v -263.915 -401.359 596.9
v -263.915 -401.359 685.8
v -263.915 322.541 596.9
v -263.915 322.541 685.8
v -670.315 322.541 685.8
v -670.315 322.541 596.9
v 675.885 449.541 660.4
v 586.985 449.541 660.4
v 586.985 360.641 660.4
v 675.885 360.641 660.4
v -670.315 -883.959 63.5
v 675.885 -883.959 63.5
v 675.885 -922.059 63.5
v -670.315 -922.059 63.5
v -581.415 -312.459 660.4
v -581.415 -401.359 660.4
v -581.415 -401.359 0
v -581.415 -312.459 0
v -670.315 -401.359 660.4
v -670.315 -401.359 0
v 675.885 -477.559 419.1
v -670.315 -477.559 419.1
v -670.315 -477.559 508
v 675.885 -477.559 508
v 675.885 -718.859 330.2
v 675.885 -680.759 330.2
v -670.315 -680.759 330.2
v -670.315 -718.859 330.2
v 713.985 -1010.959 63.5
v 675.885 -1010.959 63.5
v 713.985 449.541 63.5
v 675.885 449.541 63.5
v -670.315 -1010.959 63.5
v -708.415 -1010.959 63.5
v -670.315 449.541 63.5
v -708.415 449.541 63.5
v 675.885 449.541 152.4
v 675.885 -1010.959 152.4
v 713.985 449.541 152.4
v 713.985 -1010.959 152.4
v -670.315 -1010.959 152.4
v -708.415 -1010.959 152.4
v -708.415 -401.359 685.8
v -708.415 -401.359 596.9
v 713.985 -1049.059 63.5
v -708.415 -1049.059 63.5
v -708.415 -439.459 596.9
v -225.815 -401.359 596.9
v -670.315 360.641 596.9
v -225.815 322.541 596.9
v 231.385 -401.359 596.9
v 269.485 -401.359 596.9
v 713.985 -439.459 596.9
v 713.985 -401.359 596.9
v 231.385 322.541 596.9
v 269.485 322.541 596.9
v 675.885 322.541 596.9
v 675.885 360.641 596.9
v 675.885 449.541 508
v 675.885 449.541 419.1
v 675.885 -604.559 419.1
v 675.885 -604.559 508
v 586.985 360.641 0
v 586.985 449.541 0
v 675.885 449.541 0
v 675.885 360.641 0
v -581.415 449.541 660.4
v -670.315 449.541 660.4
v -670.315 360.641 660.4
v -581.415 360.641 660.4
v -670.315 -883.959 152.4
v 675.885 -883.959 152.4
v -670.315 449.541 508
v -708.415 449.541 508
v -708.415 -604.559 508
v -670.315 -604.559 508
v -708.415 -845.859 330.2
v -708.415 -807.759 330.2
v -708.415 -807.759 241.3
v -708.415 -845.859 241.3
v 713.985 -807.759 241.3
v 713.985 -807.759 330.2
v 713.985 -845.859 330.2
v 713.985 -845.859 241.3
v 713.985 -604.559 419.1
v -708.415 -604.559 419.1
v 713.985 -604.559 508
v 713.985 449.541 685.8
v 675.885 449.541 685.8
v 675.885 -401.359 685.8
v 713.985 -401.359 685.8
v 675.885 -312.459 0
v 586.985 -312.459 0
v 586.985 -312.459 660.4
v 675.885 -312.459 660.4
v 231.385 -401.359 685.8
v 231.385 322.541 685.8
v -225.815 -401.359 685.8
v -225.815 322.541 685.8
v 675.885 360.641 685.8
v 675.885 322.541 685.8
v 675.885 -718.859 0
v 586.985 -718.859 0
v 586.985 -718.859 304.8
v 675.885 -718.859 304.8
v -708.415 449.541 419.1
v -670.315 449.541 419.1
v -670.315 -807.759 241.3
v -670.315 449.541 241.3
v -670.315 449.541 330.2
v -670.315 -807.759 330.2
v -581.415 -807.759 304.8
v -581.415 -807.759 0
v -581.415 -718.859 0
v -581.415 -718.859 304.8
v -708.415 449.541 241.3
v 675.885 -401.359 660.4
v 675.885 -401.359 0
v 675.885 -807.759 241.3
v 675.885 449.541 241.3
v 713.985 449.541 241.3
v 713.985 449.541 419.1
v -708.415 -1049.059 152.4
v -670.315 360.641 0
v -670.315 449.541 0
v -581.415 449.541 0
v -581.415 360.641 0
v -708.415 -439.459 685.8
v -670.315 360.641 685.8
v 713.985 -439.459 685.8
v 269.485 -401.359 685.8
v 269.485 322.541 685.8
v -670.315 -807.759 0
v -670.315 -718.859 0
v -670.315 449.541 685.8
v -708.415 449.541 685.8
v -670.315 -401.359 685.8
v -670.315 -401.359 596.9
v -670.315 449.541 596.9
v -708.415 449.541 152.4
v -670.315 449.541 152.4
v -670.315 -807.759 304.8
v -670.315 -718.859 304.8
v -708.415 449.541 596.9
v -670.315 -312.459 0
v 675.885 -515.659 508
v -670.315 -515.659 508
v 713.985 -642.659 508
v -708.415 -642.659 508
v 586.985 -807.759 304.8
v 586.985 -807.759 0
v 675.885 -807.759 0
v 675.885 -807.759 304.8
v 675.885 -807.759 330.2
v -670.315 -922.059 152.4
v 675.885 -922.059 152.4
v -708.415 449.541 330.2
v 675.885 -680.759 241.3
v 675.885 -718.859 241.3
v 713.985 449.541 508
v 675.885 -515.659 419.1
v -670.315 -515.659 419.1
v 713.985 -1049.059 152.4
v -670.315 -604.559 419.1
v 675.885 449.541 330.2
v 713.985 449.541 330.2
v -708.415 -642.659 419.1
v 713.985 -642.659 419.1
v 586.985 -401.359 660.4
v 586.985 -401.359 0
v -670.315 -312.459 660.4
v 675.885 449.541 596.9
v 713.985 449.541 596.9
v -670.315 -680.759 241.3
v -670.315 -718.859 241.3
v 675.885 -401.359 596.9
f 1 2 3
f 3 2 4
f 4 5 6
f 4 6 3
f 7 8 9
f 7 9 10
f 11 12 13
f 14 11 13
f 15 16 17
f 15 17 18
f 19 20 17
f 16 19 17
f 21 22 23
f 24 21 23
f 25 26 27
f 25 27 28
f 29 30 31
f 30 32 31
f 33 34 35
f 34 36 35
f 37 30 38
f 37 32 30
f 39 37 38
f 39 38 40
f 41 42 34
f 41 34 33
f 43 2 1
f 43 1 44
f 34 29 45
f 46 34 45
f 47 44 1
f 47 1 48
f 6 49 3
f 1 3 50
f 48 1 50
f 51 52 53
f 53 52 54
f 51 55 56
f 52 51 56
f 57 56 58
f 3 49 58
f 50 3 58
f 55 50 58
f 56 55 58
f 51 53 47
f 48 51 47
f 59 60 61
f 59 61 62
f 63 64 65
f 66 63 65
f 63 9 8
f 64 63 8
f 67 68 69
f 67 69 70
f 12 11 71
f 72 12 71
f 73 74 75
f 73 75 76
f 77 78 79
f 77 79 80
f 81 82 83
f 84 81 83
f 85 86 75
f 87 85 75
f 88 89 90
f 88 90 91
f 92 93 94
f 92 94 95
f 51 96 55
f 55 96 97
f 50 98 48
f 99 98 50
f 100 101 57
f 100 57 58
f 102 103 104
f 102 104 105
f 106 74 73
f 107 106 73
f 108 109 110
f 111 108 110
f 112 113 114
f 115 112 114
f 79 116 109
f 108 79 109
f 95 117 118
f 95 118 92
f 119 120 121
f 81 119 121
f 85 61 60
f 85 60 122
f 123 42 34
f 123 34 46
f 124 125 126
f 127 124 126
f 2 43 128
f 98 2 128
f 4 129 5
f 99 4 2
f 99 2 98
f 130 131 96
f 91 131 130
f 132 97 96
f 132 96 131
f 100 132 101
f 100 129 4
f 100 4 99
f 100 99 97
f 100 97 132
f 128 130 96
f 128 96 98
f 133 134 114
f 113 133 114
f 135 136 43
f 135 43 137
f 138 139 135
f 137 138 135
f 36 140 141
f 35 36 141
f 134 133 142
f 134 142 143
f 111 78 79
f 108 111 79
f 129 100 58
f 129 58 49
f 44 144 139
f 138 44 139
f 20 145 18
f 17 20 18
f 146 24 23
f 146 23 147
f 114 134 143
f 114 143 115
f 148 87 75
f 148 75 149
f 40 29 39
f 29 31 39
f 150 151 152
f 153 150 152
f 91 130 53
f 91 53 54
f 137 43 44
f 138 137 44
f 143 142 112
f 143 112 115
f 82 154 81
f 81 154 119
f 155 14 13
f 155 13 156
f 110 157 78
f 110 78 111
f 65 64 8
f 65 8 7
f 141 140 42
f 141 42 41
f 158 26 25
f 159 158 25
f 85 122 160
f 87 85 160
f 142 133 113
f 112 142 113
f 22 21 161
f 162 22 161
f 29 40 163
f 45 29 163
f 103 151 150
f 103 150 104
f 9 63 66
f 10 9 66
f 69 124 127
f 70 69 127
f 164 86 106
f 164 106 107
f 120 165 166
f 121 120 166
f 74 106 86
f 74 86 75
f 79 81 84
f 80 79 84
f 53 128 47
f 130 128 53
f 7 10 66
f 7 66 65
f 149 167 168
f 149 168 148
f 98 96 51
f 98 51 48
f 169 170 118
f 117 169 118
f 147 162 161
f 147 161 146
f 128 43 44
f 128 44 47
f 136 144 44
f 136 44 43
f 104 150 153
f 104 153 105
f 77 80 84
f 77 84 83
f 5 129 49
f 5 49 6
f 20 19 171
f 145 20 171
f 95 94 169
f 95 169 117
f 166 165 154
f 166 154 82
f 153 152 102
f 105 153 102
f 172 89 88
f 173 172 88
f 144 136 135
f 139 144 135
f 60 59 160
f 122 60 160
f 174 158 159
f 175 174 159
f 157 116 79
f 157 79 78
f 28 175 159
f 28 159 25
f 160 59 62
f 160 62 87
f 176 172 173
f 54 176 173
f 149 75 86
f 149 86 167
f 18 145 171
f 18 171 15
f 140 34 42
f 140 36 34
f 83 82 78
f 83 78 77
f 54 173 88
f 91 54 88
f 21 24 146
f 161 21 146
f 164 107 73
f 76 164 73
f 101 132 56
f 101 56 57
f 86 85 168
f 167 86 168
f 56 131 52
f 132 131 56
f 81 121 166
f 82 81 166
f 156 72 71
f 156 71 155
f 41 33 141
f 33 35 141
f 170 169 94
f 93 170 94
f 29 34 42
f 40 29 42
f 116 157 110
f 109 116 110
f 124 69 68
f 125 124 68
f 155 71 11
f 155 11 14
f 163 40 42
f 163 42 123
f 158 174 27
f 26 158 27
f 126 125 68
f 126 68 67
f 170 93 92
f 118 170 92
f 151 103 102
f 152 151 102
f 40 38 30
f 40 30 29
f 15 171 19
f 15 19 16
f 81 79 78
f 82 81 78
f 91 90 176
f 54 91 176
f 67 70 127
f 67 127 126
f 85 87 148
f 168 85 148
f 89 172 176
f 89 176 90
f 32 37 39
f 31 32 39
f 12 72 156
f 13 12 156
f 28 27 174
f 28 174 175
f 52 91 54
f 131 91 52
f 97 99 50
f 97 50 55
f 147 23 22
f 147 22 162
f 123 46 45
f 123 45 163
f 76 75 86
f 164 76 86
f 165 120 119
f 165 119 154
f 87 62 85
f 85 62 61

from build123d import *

# Parameters (mm, degrees)
F0_W          = 88.9
F0_H          = 88.9
F1_DEPTH      = 660.4
F2_W          = 370.2267042065
F2_H          = 403.1921241929
F3_DEPTH      = 1183.64
F3_DEPTH_BACK = 1132.84
F4_W          = 38.1
F4_H          = 88.9
F5_DEPTH      = 1257.3
F5_DEPTH_BACK = 203.2
F7_DEPTH      = 2004.06
F8_W          = 38.1
F8_H          = 723.9
F9_DEPTH      = 88.9
F10_W         = 38.1
F10_H         = 88.9
F11_DEPTH     = 1422.4
F12_W         = 38.1
F12_H         = 88.9
F13_DEPTH     = 1346.2


with BuildPart() as f1:
    # F0 (on Top) → F1 (new body)
    with BuildSketch(Plane.XY):
        with Locations((-625.8649276083, 405.0910130501)):
            Rectangle(F0_W, F0_H)
    extrude(amount=F1_DEPTH)


with BuildPart() as f1b:
    # F0 (on Top) → F1, piece 2 (new body)
    with BuildSketch(Plane.XY):
        with Locations((631.4350723917, 405.0910130501)):
            Rectangle(F0_W, F0_H)
    extrude(amount=F1_DEPTH)


with BuildPart() as f1c:
    # F0 (on Top) → F1, piece 3 (new body)
    with BuildSketch(Plane.XY):
        with Locations((-625.8649276083, -356.9089869499)):
            Rectangle(F0_W, F0_H)
    extrude(amount=F1_DEPTH)


with BuildPart() as f1d:
    # F0 (on Top) → F1, piece 4 (new body)
    with BuildSketch(Plane.XY):
        with Locations((631.4350723917, -356.9089869499)):
            Rectangle(F0_W, F0_H)
    extrude(amount=F1_DEPTH)


with BuildPart() as f1e:
    # F0 (on Top) → F1, piece 5 (new body)
    with BuildSketch(Plane.XY):
        with Locations((-625.8649276083, -763.3089869499)):
            Rectangle(F0_W, F0_H)
    extrude(amount=F1_DEPTH)


with BuildPart() as f1f:
    # F0 (on Top) → F1, piece 6 (new body)
    with BuildSketch(Plane.XY):
        with Locations((631.4350723917, -763.3089869499)):
            Rectangle(F0_W, F0_H)
    extrude(amount=F1_DEPTH)


with BuildPart() as f3_tool:
    # F2 (on Right) → F3 (new body, two sides)
    with BuildSketch(Plane.YZ) as f3_sk:
        with Locations((-782.7632725239, 506.3960620965)):
            Rectangle(F2_W, F2_H)
    extrude(amount=-F3_DEPTH)
    extrude(f3_sk.sketch, amount=F3_DEPTH_BACK)


with BuildPart() as f1e_1:
    add(f1e.part)

    # F3: cut by f3_tool
    add(f3_tool.part, mode=Mode.SUBTRACT)


with BuildPart() as f1f_1:
    add(f1f.part)

    # F3: cut by f3_tool
    add(f3_tool.part, mode=Mode.SUBTRACT)


with BuildPart() as f5:
    # F4 (on face) → F5 (new body, two sides)
    with BuildSketch(Plane.XZ.offset(807.7589869499)) as f5_sk:
        with Locations((-689.3649276083, 641.35)):
            Rectangle(F4_W, F4_H)
    extrude(amount=-F5_DEPTH)
    extrude(f5_sk.sketch, amount=F5_DEPTH_BACK)


with BuildPart() as f5b:
    # F4 (on face) → F5, piece 2 (new body, two sides)
    with BuildSketch(Plane.XZ.offset(807.7589869499)) as f5_2_sk:
        with Locations((694.9350723917, 641.35)):
            Rectangle(F4_W, F4_H)
    extrude(amount=-F5_DEPTH)
    extrude(f5_2_sk.sketch, amount=F5_DEPTH_BACK)


with BuildPart() as f5c:
    # F4 (on face) → F5, piece 3 (new body, two sides)
    with BuildSketch(Plane.XZ.offset(807.7589869499)) as f5_3_sk:
        with Locations((-689.3649276083, 285.75)):
            Rectangle(F4_W, F4_H)
    extrude(amount=-F5_DEPTH)
    extrude(f5_3_sk.sketch, amount=F5_DEPTH_BACK)


with BuildPart() as f5d:
    # F4 (on face) → F5, piece 4 (new body, two sides)
    with BuildSketch(Plane.XZ.offset(807.7589869499)) as f5_4_sk:
        with Locations((694.9350723917, 285.75)):
            Rectangle(F4_W, F4_H)
    extrude(amount=-F5_DEPTH)
    extrude(f5_4_sk.sketch, amount=F5_DEPTH_BACK)


with BuildPart() as f5e:
    # F4 (on face) → F5, piece 5 (new body, two sides)
    with BuildSketch(Plane.XZ.offset(807.7589869499)) as f5_5_sk:
        with Locations((-689.3649276083, 107.95)):
            Rectangle(F4_W, F4_H)
    extrude(amount=-F5_DEPTH)
    extrude(f5_5_sk.sketch, amount=F5_DEPTH_BACK)


with BuildPart() as f5f:
    # F4 (on face) → F5, piece 6 (new body, two sides)
    with BuildSketch(Plane.XZ.offset(807.7589869499)) as f5_6_sk:
        with Locations((694.9350723917, 107.95)):
            Rectangle(F4_W, F4_H)
    extrude(amount=-F5_DEPTH)
    extrude(f5_6_sk.sketch, amount=F5_DEPTH_BACK)


with BuildPart() as f5g:
    # F4 (on face) → F5, piece 7 (new body, two sides)
    with BuildSketch(Plane.XZ.offset(807.7589869499)) as f5_7_sk:
        with Locations((-689.3649276083, 463.55)):
            Rectangle(F4_W, F4_H)
    extrude(amount=-F5_DEPTH)
    extrude(f5_7_sk.sketch, amount=F5_DEPTH_BACK)


with BuildPart() as f5h:
    # F4 (on face) → F5, piece 8 (new body, two sides)
    with BuildSketch(Plane.XZ.offset(807.7589869499)) as f5_8_sk:
        with Locations((694.9350723917, 463.55)):
            Rectangle(F4_W, F4_H)
    extrude(amount=-F5_DEPTH)
    extrude(f5_8_sk.sketch, amount=F5_DEPTH_BACK)


with BuildPart() as f7_tool:
    # F6 (on face) → F7 (new body)
    with BuildSketch(Plane(origin=(-708.4149276083, 0, 0), x_dir=(0, -1, 0), z_dir=(-1, 0, 0))):
        Polygon((1041.3569460869, 722.2948670387), (401.3589869499, 719.6282148361), (401.3589869499, 535.6287360191), (604.5589869499, 535.6287360191), (604.5589869499, 378.2958984375), (807.7589869499, 378.2958984375), (807.7589869499, 220.9630459547), (1041.3569460869, 220.9630459547), align=None)
    extrude(amount=-F7_DEPTH)


with BuildPart() as f5_1:
    add(f5.part)

    # F7: cut by f7_tool
    add(f7_tool.part, mode=Mode.SUBTRACT)


with BuildPart() as f5b_1:
    add(f5b.part)

    # F7: cut by f7_tool
    add(f7_tool.part, mode=Mode.SUBTRACT)


with BuildPart() as f5c_1:
    add(f5c.part)

    # F7: cut by f7_tool
    add(f7_tool.part, mode=Mode.SUBTRACT)


with BuildPart() as f5d_1:
    add(f5d.part)

    # F7: cut by f7_tool
    add(f7_tool.part, mode=Mode.SUBTRACT)


with BuildPart() as f5g_1:
    add(f5g.part)

    # F7: cut by f7_tool
    add(f7_tool.part, mode=Mode.SUBTRACT)


with BuildPart() as f5h_1:
    add(f5h.part)

    # F7: cut by f7_tool
    add(f7_tool.part, mode=Mode.SUBTRACT)


with BuildPart() as f9:
    # F8 (on face) → F9 (new body)
    with BuildSketch(Plane.XY.offset(685.8)):
        Polygon((675.8850723917, 360.6410130501), (-670.3149276083, 360.6410130501), (-670.3149276083, 322.5410130501), (-263.9149276083, 322.5410130501), (-225.8149276083, 322.5410130501), (231.3850723917, 322.5410130501), (269.4850723917, 322.5410130501), (675.8850723917, 322.5410130501), align=None)
        with Locations((-244.8649276083, -39.4089869499)):
            Rectangle(F8_W, F8_H)
        with Locations((250.4350723917, -39.4089869499)):
            Rectangle(F8_W, F8_H)
        Polygon((-225.8149276083, -401.3589869499), (-263.9149276083, -401.3589869499), (-708.4149276083, -401.3589869499), (-708.4149276083, -439.4589869499), (713.9850723917, -439.4589869499), (713.9850723917, -401.3589869499), (269.4850723917, -401.3589869499), (231.3850723917, -401.3589869499), align=None)
    extrude(amount=-F9_DEPTH)


with BuildPart() as f11:
    # F10 (on face) → F11 (new body, through all)
    with BuildSketch(Plane(origin=(-708.4149276083, 0, 0), x_dir=(0, -1, 0), z_dir=(-1, 0, 0))):
        with Locations((623.6089869499, 463.55)):
            Rectangle(F10_W, F10_H)
    extrude(amount=-F11_DEPTH)


with BuildPart() as f11b:
    # F10 (on face) → F11, piece 2 (new body, through all)
    with BuildSketch(Plane(origin=(-708.4149276083, 0, 0), x_dir=(0, -1, 0), z_dir=(-1, 0, 0))):
        with Locations((826.8089869499, 285.75)):
            Rectangle(F10_W, F10_H)
    extrude(amount=-F11_DEPTH)


with BuildPart() as f11c:
    # F10 (on face) → F11, piece 3 (new body, through all)
    with BuildSketch(Plane(origin=(-708.4149276083, 0, 0), x_dir=(0, -1, 0), z_dir=(-1, 0, 0))):
        with Locations((1030.0089869499, 107.95)):
            Rectangle(F10_W, F10_H)
    extrude(amount=-F11_DEPTH)


with BuildPart() as f13:
    # F12 (on face) → F13 (new body, through all)
    with BuildSketch(Plane(origin=(675.8850723917, 0, 0), x_dir=(0, -1, 0), z_dir=(-1, 0, 0))):
        with Locations((496.6089869499, 463.55)):
            Rectangle(F12_W, F12_H)
    extrude(amount=F13_DEPTH)


with BuildPart() as f13b:
    # F12 (on face) → F13, piece 2 (new body, through all)
    with BuildSketch(Plane(origin=(675.8850723917, 0, 0), x_dir=(0, -1, 0), z_dir=(-1, 0, 0))):
        with Locations((903.0089869499, 107.95)):
            Rectangle(F12_W, F12_H)
    extrude(amount=F13_DEPTH)


with BuildPart() as f13c:
    # F12 (on face) → F13, piece 3 (new body, through all)
    with BuildSketch(Plane(origin=(675.8850723917, 0, 0), x_dir=(0, -1, 0), z_dir=(-1, 0, 0))):
        with Locations((699.8089869499, 285.75)):
            Rectangle(F12_W, F12_H)
    extrude(amount=F13_DEPTH)


solid = Compound([f1.part, f1b.part, f1c.part, f1d.part, f1e_1.part, f1f_1.part, f5e.part, f5f.part, f5_1.part, f5b_1.part, f5c_1.part, f5d_1.part, f5g_1.part, f5h_1.part, f9.part, f11.part, f11b.part, f11c.part, f13.part, f13b.part, f13c.part])
